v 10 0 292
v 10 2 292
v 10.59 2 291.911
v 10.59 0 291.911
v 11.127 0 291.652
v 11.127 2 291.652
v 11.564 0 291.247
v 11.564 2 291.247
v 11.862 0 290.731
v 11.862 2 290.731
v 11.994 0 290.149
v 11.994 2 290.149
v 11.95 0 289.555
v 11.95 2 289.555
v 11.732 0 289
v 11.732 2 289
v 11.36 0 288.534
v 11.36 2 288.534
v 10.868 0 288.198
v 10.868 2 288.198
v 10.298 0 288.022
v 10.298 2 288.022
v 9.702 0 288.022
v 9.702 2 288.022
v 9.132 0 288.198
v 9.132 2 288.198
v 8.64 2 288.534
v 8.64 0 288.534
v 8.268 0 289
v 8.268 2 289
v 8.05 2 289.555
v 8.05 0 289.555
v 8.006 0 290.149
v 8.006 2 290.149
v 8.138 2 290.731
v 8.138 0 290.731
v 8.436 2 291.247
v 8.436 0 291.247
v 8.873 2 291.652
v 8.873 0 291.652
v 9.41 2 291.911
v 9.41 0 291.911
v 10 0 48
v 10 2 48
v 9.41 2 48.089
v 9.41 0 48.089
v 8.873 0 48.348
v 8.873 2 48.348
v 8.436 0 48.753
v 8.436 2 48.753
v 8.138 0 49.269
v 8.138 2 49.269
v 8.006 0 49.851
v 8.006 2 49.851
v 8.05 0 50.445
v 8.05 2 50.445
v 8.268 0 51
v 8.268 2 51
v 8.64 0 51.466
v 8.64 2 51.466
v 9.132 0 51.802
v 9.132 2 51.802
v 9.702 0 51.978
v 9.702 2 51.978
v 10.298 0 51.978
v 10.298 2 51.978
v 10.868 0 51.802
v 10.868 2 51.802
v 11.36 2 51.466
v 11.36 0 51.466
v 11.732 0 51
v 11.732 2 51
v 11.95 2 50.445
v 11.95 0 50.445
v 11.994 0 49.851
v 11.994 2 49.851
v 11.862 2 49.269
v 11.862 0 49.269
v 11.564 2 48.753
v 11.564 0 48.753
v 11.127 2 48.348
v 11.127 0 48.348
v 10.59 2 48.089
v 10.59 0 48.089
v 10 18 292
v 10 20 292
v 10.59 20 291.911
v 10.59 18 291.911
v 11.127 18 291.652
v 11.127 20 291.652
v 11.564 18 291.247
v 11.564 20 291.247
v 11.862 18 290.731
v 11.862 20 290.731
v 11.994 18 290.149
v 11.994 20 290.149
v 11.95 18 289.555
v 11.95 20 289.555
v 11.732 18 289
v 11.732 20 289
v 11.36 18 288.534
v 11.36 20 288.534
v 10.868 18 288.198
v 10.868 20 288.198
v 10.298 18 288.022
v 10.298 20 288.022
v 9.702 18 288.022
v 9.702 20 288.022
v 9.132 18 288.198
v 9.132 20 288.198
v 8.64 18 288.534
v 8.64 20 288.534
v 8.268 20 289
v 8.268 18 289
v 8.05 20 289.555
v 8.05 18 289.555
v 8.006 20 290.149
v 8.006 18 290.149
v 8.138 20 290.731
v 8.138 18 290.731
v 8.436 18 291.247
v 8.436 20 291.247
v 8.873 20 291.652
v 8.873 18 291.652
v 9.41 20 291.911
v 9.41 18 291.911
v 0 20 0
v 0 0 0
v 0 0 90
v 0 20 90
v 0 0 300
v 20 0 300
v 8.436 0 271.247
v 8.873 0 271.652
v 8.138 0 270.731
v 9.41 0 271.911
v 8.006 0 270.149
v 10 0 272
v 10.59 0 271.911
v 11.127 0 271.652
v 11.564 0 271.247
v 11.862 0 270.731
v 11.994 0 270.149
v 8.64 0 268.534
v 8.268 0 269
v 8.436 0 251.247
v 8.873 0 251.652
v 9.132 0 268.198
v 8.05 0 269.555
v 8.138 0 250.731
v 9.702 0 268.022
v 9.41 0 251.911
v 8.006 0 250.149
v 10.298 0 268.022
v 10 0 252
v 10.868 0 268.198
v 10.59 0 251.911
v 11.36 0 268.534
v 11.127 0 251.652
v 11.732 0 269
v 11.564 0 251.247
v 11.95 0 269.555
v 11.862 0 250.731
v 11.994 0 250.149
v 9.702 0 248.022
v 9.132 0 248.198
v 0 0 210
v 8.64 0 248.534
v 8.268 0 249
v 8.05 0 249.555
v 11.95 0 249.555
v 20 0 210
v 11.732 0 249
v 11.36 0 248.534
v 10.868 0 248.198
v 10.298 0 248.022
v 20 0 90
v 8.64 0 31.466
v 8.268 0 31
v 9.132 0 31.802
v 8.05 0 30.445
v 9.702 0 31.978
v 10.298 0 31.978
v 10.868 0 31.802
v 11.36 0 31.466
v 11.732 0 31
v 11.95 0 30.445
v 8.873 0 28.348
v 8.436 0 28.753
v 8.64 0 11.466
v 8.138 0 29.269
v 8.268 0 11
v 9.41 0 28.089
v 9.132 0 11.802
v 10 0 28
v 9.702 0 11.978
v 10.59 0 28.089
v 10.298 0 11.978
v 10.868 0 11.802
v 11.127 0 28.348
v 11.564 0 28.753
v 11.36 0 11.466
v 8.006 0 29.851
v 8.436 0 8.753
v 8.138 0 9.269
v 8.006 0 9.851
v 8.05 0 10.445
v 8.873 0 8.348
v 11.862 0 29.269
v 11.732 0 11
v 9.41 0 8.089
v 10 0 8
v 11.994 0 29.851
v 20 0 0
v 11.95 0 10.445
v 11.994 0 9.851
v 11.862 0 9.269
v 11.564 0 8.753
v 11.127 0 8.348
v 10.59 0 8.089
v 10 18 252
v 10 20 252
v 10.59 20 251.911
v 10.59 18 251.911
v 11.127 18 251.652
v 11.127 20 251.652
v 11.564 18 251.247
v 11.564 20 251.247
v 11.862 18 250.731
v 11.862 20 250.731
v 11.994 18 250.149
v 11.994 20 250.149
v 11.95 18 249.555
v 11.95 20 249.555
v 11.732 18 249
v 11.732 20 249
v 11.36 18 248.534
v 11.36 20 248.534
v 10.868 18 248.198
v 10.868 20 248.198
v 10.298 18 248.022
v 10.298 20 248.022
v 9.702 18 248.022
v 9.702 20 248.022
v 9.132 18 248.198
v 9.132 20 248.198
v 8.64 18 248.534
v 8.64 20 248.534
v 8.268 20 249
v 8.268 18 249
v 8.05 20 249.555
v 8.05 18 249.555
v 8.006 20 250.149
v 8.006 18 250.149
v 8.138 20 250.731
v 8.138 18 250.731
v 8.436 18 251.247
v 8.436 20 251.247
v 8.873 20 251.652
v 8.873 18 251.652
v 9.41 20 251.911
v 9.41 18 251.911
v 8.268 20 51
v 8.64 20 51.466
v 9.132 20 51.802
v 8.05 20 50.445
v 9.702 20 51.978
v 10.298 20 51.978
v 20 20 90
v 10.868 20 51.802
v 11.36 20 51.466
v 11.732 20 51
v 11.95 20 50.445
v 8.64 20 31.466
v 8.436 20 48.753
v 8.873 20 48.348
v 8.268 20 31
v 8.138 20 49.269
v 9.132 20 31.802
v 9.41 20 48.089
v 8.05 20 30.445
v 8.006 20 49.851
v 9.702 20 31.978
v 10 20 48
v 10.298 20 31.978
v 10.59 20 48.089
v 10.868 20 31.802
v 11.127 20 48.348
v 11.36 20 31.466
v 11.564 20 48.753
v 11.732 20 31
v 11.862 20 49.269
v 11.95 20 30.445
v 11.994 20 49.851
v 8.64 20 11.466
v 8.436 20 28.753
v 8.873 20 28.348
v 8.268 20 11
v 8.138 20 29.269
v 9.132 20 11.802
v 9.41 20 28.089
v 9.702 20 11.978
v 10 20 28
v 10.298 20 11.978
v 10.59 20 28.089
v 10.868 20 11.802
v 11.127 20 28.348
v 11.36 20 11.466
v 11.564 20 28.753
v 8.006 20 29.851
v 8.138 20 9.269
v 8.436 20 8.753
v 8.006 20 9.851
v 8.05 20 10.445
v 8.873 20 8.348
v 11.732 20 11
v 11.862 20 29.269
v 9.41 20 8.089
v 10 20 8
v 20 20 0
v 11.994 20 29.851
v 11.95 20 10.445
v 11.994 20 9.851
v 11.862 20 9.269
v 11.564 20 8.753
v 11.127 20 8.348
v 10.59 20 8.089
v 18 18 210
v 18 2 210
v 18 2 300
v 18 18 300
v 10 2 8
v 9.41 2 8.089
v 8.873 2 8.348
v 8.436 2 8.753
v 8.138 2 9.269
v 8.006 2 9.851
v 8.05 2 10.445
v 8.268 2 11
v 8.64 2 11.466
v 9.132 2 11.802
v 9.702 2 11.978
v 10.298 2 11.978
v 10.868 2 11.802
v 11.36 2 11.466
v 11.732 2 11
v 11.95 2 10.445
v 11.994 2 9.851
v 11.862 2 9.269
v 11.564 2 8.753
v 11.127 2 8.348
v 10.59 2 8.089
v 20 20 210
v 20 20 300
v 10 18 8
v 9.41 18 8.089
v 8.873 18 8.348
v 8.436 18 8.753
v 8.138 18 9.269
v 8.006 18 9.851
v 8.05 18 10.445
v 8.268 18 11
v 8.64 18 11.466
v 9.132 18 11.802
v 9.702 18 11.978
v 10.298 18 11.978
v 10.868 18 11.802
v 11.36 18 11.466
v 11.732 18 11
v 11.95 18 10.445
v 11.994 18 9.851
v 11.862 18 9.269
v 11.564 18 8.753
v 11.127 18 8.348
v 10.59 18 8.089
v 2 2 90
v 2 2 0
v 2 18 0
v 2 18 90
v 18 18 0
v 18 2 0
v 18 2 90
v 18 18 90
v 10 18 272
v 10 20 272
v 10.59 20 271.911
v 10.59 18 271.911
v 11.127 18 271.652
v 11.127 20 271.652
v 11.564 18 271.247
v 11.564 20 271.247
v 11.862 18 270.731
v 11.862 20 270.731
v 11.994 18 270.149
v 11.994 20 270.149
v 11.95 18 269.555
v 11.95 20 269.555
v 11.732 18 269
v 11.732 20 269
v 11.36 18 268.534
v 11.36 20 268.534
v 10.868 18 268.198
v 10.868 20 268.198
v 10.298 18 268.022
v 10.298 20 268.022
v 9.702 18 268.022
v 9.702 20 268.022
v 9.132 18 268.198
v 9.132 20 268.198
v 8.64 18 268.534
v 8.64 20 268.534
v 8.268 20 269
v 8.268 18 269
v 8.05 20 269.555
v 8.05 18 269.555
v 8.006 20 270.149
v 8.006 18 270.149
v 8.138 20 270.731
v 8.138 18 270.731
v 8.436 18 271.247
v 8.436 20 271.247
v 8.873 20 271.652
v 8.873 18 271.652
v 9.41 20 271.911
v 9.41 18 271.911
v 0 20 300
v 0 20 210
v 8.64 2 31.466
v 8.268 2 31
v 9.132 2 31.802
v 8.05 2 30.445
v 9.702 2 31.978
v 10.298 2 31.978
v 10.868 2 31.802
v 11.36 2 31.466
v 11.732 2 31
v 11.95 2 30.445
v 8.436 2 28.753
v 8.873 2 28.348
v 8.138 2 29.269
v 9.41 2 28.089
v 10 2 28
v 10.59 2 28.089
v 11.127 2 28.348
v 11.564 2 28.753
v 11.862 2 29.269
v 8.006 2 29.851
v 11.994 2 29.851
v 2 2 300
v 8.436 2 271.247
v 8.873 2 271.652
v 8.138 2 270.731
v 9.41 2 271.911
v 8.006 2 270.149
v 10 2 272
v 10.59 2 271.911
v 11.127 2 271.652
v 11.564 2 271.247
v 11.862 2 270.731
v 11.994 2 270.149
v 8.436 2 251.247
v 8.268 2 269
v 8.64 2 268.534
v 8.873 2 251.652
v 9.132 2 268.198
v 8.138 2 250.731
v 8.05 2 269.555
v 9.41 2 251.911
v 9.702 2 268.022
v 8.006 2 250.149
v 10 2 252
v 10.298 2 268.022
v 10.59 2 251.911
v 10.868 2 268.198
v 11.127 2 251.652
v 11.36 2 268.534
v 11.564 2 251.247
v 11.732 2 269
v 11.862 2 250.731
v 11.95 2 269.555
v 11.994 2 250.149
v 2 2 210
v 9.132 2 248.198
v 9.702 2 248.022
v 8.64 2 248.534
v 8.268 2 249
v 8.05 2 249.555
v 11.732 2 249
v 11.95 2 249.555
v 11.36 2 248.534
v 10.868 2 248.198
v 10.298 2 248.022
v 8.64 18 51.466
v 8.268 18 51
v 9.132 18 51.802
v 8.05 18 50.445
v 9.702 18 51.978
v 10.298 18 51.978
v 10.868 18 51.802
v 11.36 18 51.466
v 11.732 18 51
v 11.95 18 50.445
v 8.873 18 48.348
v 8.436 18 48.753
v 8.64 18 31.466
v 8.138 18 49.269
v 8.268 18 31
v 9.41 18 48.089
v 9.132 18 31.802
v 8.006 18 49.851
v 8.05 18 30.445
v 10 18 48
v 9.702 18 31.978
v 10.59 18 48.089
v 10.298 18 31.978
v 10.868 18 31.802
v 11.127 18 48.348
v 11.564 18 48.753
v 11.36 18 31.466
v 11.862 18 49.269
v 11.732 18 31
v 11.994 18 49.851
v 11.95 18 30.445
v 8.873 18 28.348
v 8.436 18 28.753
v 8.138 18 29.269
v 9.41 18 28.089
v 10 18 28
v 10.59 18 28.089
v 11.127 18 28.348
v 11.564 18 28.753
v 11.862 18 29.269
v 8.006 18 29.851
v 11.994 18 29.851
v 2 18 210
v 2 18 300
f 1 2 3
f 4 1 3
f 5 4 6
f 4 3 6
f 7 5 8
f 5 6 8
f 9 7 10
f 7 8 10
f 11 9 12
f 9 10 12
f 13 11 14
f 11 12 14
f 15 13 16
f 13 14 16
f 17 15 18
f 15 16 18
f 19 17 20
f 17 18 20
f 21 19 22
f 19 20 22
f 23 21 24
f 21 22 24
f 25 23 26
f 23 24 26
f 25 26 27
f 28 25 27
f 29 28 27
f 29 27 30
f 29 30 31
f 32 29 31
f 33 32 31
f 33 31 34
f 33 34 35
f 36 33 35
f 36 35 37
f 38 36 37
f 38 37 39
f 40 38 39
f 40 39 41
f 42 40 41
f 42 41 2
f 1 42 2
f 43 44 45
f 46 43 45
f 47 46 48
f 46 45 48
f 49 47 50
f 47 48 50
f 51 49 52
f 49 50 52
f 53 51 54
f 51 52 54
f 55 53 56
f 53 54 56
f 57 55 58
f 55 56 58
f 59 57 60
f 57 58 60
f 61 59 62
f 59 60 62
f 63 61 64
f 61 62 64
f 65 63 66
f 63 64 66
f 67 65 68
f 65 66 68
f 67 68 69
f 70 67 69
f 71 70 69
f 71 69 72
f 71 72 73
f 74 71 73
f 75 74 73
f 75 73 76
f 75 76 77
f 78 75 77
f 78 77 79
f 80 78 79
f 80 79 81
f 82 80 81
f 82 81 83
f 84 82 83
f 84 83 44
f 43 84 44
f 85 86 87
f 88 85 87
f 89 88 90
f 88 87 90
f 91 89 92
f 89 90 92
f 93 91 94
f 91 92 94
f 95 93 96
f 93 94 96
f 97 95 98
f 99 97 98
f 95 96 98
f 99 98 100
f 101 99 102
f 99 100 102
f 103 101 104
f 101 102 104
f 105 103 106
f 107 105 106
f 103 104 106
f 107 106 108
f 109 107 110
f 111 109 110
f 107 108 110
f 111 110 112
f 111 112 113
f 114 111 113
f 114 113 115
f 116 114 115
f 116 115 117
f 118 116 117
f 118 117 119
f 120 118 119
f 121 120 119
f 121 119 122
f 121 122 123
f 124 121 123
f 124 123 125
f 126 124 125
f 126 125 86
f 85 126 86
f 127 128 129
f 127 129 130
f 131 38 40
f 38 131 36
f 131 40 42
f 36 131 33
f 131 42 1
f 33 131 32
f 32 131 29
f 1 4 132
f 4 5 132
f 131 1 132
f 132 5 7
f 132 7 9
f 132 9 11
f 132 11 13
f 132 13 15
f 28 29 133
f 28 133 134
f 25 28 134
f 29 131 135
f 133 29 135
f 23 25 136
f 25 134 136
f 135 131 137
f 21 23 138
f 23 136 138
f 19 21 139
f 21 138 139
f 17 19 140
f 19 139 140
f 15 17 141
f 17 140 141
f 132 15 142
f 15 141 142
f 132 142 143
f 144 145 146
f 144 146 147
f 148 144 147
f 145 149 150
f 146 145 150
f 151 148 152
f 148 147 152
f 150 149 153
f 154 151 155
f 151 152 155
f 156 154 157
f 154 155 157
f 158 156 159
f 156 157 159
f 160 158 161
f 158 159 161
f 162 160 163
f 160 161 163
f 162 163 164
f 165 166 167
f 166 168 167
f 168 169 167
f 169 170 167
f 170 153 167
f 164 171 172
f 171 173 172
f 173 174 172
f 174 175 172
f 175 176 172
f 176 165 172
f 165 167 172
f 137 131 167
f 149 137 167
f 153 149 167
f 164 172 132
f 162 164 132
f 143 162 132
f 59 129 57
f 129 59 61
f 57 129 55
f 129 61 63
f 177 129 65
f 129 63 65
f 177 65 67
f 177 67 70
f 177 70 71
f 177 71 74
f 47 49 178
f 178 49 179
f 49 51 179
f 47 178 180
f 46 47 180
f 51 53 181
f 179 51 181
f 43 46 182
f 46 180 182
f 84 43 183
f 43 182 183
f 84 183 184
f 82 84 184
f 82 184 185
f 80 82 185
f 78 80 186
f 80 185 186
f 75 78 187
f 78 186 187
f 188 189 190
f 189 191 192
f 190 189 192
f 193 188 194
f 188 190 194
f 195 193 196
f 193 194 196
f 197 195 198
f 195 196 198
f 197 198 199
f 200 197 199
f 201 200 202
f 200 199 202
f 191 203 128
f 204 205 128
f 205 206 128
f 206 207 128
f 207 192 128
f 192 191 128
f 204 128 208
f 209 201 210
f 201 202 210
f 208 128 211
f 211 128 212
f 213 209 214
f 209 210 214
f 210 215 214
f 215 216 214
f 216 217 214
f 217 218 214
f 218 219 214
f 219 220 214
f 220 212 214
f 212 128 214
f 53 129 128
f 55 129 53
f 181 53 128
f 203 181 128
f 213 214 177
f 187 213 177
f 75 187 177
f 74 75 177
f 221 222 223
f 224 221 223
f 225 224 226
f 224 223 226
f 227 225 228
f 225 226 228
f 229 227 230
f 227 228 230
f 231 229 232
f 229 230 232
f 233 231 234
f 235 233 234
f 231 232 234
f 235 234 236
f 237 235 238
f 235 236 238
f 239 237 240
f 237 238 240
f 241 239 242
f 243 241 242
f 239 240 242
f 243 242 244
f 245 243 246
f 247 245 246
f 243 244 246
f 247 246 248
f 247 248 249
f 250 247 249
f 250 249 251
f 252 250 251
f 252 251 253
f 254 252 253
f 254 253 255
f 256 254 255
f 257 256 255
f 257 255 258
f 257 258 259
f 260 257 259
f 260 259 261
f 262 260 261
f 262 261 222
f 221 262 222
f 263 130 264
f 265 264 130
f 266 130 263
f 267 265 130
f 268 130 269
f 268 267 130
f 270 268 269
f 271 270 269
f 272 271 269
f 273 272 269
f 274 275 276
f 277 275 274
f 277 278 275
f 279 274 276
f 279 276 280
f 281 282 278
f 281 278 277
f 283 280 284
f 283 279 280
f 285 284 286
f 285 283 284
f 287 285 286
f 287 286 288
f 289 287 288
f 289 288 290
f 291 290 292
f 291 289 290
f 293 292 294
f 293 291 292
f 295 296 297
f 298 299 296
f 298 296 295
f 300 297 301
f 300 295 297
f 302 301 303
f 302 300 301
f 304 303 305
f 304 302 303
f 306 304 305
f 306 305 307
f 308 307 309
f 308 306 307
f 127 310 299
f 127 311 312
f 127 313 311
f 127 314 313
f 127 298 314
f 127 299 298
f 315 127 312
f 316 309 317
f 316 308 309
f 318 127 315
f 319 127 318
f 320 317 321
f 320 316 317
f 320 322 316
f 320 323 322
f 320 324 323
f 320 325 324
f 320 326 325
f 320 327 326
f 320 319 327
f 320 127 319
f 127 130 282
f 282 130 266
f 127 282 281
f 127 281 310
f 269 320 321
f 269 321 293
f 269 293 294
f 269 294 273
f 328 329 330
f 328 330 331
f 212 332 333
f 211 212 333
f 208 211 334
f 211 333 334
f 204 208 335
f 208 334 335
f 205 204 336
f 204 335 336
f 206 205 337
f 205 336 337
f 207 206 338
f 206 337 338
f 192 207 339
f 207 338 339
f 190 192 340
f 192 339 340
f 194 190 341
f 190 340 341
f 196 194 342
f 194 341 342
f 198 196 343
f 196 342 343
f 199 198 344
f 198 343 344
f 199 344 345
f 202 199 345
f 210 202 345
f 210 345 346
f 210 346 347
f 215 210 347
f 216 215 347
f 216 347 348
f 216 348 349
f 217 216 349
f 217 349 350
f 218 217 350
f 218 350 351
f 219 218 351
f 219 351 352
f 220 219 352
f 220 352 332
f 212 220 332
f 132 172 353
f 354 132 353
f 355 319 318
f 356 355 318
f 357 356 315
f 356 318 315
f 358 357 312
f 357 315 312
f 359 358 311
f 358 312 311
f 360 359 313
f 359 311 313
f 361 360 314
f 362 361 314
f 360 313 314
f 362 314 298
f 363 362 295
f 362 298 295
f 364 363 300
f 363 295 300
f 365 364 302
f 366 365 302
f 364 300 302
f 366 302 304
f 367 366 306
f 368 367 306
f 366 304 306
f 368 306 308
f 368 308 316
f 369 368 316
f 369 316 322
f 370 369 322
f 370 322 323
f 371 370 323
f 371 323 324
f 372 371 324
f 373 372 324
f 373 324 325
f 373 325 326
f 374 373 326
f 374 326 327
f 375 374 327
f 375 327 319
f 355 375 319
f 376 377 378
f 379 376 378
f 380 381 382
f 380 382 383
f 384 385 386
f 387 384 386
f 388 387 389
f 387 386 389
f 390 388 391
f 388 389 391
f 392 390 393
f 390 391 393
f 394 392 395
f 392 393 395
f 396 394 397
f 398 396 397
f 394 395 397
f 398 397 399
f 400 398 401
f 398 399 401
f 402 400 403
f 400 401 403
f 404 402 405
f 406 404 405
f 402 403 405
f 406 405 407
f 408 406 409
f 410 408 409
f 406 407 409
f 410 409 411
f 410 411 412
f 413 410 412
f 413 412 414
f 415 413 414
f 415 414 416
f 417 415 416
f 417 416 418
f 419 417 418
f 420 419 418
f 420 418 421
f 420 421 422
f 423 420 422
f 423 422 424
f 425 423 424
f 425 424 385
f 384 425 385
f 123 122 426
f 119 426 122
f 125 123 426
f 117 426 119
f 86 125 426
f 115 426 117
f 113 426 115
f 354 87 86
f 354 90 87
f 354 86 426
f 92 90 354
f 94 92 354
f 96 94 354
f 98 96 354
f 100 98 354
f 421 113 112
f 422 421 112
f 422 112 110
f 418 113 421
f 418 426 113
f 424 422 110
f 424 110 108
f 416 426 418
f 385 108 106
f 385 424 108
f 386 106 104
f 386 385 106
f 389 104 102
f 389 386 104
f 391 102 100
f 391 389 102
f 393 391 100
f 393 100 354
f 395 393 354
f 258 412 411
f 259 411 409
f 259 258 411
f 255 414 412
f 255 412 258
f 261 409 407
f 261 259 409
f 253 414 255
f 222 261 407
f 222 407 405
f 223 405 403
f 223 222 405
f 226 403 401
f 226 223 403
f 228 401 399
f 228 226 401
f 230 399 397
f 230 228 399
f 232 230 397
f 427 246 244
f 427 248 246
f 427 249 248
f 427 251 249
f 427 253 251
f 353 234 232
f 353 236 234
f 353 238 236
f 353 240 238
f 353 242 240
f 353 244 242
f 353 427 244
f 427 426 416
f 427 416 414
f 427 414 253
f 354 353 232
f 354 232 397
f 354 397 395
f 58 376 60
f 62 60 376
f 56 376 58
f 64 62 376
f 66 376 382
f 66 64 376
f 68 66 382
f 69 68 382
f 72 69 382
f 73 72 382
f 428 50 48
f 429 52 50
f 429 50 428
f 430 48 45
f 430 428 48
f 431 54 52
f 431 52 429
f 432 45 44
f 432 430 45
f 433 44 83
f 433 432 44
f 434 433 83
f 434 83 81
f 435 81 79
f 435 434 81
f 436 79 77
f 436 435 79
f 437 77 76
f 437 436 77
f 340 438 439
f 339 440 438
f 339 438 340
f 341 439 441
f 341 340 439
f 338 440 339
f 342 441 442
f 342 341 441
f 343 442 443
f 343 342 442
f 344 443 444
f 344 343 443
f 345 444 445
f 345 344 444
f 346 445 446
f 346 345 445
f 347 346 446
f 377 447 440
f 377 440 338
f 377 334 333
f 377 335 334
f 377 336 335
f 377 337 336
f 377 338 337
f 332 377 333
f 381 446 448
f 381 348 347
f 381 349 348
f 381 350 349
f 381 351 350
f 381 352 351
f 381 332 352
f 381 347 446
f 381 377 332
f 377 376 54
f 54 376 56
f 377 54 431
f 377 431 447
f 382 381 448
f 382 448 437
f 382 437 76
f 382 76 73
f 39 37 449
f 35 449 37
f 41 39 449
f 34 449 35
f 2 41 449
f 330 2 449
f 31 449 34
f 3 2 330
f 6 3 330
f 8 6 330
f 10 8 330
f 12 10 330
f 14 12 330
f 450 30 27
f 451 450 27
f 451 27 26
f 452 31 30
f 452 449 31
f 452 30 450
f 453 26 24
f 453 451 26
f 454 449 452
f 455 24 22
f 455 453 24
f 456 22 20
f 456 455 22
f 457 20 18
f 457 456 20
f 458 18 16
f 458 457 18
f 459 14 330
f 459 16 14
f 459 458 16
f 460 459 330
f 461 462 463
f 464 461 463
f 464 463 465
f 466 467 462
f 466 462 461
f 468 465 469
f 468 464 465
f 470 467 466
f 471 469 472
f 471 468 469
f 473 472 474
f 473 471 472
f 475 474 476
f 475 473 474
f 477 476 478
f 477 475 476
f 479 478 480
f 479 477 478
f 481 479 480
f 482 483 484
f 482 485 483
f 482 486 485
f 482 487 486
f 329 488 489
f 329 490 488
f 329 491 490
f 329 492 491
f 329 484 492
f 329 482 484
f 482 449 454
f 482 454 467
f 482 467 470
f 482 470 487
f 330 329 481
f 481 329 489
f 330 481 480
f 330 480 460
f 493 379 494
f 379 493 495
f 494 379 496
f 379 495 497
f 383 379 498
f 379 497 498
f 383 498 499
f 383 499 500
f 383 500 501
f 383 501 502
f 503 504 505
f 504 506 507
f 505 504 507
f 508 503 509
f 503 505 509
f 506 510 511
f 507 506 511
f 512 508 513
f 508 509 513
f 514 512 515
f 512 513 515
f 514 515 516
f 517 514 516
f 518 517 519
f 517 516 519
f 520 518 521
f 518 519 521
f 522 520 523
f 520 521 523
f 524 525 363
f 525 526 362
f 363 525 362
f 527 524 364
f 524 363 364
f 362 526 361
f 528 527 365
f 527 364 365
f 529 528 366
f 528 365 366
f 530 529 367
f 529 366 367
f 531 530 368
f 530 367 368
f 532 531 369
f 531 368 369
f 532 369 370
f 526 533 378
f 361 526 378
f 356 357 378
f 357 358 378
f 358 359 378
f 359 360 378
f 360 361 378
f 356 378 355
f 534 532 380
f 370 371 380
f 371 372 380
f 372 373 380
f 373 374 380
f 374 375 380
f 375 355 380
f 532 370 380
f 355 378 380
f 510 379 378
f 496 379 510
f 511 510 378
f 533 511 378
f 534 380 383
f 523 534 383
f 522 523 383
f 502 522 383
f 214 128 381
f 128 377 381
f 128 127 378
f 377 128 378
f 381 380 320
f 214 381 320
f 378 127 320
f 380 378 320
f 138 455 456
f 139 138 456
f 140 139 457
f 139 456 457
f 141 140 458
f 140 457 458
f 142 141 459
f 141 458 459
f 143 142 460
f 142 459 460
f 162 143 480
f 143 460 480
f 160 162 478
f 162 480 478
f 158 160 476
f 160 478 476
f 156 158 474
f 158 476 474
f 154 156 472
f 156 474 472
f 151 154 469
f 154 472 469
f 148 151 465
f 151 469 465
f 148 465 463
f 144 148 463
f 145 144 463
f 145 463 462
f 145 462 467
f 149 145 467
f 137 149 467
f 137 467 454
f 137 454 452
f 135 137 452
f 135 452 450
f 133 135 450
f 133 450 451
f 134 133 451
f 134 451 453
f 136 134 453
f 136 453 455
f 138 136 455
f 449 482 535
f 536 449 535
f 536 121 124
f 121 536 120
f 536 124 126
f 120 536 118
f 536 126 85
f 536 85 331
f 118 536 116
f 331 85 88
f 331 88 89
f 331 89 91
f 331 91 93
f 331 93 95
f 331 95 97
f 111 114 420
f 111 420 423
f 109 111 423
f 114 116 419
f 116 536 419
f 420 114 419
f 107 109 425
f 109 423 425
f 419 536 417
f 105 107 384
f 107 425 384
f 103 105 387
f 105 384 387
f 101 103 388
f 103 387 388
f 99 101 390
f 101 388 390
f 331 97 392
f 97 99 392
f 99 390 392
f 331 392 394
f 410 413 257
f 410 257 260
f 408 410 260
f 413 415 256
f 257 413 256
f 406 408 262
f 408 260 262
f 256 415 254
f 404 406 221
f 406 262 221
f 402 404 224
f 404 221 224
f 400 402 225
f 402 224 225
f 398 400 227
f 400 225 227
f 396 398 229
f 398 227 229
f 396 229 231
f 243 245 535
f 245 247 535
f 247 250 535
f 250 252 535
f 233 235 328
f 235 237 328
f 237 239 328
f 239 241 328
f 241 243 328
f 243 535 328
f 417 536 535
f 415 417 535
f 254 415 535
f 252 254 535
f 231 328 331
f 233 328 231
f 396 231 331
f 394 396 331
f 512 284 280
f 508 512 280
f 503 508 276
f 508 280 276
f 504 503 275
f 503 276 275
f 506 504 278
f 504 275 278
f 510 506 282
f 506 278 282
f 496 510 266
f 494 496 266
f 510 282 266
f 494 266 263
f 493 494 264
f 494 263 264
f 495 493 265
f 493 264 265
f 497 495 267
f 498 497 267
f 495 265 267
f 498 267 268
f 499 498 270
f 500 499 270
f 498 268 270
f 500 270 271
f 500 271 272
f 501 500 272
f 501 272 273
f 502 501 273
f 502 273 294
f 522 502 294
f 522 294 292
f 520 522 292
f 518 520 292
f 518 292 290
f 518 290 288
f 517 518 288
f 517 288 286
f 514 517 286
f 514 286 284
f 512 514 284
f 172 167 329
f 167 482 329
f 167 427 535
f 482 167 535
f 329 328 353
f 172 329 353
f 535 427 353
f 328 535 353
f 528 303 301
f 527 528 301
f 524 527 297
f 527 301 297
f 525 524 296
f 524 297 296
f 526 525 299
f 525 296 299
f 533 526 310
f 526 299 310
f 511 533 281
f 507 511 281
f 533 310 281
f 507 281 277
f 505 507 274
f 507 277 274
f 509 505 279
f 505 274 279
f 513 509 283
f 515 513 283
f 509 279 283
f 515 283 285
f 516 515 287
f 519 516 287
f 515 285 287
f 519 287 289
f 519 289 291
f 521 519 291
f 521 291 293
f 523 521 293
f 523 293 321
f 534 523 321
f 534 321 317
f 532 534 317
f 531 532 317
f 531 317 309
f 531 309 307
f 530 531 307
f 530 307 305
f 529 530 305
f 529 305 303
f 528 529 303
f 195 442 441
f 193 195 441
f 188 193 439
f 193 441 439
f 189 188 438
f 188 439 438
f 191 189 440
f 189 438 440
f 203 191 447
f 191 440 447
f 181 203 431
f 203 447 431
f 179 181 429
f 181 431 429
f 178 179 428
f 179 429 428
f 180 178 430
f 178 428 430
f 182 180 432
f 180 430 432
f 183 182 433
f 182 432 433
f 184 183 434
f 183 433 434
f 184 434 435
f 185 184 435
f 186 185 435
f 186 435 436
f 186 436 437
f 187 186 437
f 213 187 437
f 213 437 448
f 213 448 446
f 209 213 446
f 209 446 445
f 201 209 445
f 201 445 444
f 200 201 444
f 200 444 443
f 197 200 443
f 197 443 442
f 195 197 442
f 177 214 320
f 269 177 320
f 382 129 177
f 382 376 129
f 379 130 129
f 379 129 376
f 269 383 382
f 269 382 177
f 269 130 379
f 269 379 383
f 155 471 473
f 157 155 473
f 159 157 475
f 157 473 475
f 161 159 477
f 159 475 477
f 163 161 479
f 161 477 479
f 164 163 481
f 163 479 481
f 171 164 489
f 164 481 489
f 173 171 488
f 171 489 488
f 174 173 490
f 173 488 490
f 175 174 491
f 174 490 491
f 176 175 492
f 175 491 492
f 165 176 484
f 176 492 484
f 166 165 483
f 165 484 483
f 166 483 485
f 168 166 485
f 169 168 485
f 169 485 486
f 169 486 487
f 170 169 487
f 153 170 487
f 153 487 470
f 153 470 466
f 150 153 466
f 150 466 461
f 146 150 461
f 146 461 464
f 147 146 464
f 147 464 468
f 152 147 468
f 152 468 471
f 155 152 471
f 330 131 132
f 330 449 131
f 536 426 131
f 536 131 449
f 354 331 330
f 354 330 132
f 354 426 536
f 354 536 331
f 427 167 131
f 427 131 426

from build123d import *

# Parameters (mm, degrees)
SKETCH_1_W          = 20
SKETCH_1_H          = 20
SKETCH_1_W_2        = 16
SKETCH_1_H_2        = 16
EXTRUDE_1_DEPTH     = 300
SKETCH_2_R          = 2
CUT_EXTRUDE_1_DEPTH = 302.330383466
SKETCH_3_W          = 20
SKETCH_3_H          = 120
CUT_EXTRUDE_2_DEPTH = 302.330383466


with BuildPart() as part:
    # 草图1 → 拉伸-薄壁1 (new body)
    with BuildSketch(Plane.XY):
        with Locations((10, 10)):
            Rectangle(SKETCH_1_W, SKETCH_1_H)
        with Locations((10, 10)):
            Rectangle(SKETCH_1_W_2, SKETCH_1_H_2, mode=Mode.SUBTRACT)
    extrude(amount=EXTRUDE_1_DEPTH)

    # 草图2 → 切除-拉伸1 (cut, through all)
    with BuildSketch(Plane(origin=(0, 20, 0), x_dir=(1, 0, 0), z_dir=(0, 1, 0))):
        with Locations(Location((10, -290, 0), (0, 0, 270))):
            Circle(SKETCH_2_R)
        with Locations(Location((10, -270, 0), (0, 0, 270))):
            Circle(SKETCH_2_R)
        with Locations(Location((10, -250, 0), (0, 0, 270))):
            Circle(SKETCH_2_R)
        with Locations(Location((10, -10, 0), (0, 0, 90))):
            Circle(SKETCH_2_R)
        with Locations(Location((10, -30, 0), (0, 0, 90))):
            Circle(SKETCH_2_R)
        with Locations(Location((10, -50, 0), (0, 0, 90))):
            Circle(SKETCH_2_R)
    extrude(amount=-CUT_EXTRUDE_1_DEPTH, mode=Mode.SUBTRACT)

    # 草图3 → 切除-拉伸2 (cut, through all)
    with BuildSketch(Plane(origin=(0, 20, 0), x_dir=(1, 0, 0), z_dir=(0, 1, 0))):
        with Locations((10, -150)):
            Rectangle(SKETCH_3_W, SKETCH_3_H)
    extrude(amount=-CUT_EXTRUDE_2_DEPTH, mode=Mode.SUBTRACT)


with BuildPart() as cut_extrude_2_piece_1:
    # of the separate pieces the step leaves, piece 1, a body of its own (cut_extrude_2_pieces)
    add(part.part.solids().sort_by_distance((20, 20, 0))[0])


with BuildPart() as cut_extrude_2_piece_2:
    # of the separate pieces the step leaves, piece 2, a body of its own (cut_extrude_2_pieces)
    add(part.part.solids().sort_by_distance((20, 20, 210))[0])


solid = Compound([cut_extrude_2_piece_1.part, cut_extrude_2_piece_2.part])
